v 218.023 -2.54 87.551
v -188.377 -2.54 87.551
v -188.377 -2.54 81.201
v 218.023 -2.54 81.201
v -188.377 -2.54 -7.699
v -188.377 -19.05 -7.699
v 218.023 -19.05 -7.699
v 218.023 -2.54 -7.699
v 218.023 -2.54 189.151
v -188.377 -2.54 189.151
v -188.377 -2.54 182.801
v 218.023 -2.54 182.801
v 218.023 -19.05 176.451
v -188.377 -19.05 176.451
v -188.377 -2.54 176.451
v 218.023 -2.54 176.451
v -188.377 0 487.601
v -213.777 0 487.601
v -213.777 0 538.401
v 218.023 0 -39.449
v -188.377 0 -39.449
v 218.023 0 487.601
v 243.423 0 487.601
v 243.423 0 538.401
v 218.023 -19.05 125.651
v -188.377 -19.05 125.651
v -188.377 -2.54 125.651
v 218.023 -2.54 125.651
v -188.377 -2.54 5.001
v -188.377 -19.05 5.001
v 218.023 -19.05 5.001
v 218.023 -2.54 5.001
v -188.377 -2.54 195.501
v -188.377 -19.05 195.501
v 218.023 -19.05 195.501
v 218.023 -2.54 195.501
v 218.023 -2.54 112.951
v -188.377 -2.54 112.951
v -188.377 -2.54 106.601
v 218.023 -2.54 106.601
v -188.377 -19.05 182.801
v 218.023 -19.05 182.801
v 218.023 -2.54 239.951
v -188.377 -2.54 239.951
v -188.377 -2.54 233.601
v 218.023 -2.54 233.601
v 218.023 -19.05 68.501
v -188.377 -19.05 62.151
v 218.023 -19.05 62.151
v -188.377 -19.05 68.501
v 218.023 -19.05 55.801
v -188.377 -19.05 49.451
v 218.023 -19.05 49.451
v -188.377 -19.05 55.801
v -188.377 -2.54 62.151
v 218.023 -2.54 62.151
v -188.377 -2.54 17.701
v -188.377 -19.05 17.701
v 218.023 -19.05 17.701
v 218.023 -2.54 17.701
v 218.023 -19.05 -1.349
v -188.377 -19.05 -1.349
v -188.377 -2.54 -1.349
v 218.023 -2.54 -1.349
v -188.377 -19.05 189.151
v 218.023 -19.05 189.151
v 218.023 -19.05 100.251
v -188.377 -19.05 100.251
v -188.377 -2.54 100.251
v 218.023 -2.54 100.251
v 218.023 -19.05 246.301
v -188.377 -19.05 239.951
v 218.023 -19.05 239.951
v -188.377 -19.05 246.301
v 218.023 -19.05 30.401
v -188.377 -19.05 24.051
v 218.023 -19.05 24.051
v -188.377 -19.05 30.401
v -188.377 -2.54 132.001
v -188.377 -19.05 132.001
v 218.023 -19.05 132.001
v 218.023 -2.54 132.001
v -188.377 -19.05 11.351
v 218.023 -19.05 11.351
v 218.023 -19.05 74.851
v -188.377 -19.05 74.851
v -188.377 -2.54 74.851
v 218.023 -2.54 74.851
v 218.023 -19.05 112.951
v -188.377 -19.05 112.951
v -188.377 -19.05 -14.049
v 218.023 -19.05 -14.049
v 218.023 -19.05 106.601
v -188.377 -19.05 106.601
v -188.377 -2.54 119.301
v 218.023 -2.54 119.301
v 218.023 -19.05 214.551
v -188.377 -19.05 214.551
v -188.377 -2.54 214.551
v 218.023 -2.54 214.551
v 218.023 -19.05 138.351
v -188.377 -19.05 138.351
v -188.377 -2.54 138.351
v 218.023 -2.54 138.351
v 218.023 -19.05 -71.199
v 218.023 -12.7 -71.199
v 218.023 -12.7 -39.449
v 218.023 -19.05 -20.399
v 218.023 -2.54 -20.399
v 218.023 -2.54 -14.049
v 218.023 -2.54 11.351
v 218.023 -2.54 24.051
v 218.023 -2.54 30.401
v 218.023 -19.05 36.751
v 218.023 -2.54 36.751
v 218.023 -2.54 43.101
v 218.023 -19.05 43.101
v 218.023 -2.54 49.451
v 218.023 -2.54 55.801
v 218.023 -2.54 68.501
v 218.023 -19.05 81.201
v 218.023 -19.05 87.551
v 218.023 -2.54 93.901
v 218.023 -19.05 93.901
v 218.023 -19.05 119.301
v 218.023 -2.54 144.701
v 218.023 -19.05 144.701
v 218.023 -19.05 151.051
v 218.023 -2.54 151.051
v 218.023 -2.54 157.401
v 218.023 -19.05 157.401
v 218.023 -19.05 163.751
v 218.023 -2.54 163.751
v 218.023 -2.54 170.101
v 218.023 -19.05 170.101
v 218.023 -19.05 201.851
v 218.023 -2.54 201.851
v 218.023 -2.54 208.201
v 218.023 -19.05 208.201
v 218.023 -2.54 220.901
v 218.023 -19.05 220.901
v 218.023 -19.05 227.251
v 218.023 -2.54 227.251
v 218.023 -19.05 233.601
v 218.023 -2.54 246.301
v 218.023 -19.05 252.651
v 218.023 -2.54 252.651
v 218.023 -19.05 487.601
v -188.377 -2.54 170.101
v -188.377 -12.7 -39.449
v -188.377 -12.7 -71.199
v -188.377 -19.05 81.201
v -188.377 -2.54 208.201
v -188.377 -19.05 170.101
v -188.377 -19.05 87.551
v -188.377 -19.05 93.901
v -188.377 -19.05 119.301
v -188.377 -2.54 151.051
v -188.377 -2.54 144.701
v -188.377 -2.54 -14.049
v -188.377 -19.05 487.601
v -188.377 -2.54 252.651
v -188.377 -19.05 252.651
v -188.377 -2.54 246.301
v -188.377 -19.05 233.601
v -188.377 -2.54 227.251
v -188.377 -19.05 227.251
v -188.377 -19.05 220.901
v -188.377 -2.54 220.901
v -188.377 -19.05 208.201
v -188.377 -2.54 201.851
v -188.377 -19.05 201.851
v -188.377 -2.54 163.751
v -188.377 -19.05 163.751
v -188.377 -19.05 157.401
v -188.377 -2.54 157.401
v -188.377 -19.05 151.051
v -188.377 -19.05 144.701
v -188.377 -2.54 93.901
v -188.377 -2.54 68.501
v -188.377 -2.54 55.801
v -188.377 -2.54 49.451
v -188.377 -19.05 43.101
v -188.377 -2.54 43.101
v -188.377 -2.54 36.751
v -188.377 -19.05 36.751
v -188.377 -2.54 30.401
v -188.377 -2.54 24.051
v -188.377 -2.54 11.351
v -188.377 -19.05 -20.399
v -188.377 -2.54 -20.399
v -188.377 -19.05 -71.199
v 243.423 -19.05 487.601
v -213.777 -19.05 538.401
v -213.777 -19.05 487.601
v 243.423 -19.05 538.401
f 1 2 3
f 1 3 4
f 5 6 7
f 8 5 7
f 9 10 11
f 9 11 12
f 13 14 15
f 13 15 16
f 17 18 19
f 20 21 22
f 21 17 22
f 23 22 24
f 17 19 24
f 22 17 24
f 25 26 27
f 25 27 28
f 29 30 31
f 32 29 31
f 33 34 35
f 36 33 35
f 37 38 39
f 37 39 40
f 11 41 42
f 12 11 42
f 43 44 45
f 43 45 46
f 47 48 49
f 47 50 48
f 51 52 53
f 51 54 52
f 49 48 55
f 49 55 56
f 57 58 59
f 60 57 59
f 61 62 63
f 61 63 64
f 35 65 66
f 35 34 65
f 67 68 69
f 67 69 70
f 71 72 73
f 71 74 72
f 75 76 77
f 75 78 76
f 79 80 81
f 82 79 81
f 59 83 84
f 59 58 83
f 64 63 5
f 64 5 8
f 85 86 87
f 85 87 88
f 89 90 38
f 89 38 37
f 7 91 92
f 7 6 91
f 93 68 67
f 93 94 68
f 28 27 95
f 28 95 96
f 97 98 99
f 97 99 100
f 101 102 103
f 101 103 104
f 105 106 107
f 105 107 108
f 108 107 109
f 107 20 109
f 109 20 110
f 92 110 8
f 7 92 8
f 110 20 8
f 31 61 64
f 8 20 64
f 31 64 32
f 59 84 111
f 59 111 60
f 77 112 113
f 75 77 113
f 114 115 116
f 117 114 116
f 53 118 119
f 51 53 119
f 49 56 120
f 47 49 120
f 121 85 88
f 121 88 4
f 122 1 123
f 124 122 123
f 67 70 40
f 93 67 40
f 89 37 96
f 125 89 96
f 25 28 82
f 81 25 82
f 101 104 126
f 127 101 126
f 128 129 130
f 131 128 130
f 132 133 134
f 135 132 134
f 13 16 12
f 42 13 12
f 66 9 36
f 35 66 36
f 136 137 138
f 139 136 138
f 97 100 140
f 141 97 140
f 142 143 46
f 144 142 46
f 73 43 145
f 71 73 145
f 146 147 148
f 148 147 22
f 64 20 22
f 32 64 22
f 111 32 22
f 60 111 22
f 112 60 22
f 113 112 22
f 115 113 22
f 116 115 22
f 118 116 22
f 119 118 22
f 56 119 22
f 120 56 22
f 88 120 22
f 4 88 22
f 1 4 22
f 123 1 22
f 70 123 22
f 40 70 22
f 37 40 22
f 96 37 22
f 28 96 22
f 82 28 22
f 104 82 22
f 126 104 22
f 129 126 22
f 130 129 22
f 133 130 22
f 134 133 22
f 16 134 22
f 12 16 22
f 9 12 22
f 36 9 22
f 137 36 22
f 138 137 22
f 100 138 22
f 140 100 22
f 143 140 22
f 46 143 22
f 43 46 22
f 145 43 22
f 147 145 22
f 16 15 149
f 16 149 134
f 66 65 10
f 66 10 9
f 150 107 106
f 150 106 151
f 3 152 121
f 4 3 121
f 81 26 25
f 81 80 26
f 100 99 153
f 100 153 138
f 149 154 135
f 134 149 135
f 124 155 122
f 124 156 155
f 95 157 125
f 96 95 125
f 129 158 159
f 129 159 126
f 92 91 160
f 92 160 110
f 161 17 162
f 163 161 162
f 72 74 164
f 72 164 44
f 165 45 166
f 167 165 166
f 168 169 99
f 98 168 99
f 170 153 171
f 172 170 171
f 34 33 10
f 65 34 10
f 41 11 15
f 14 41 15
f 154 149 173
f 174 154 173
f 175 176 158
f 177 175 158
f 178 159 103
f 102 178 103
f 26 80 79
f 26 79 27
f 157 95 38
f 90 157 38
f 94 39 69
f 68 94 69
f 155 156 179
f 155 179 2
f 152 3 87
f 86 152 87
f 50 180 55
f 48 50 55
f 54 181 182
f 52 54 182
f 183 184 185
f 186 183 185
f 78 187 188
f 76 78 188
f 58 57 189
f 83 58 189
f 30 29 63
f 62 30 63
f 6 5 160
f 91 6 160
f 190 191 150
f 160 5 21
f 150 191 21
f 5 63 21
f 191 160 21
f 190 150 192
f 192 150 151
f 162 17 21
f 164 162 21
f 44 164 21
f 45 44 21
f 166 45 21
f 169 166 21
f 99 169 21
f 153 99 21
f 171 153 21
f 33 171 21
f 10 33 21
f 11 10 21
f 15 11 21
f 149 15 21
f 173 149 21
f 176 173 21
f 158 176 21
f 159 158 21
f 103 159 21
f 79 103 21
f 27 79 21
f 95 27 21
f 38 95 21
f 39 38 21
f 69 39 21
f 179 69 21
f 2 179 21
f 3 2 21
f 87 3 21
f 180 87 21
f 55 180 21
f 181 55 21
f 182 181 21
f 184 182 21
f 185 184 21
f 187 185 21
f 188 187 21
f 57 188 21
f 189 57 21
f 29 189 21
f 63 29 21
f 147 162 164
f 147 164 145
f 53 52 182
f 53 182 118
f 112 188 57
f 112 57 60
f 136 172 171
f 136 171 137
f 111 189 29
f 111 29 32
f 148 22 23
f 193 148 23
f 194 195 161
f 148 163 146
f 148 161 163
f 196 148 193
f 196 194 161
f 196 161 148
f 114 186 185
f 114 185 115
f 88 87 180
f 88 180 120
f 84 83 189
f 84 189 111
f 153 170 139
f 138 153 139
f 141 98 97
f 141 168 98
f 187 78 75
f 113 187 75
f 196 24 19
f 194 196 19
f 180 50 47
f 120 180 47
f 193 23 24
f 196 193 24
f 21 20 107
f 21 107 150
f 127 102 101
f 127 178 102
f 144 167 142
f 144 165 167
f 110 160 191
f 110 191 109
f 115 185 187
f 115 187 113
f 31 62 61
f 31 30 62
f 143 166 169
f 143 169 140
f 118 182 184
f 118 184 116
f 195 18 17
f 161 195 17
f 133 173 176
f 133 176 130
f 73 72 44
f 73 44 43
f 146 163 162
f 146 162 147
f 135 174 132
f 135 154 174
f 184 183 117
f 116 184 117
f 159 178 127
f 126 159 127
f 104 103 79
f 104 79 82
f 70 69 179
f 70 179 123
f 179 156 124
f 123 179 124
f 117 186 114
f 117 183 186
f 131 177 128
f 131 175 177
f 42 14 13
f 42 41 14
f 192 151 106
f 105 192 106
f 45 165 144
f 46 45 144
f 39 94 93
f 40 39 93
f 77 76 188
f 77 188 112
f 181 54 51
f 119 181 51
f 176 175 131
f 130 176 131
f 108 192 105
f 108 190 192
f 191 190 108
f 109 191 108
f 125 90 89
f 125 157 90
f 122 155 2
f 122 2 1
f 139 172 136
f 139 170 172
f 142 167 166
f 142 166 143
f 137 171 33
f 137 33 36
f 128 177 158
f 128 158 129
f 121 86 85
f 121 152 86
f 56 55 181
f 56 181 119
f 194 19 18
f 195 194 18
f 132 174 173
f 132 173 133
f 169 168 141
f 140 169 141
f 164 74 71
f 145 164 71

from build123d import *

# Parameters (mm, degrees)
F1_DEPTH = 19.05
F2_W     = 406.4
F2_H     = 6.35
F3_DEPTH = 16.51
F4_W     = 406.4
F4_H     = 31.75
F5_DEPTH = 12.7


with BuildPart() as f1:
    # F0 (on Front) → F1 (new body)
    with BuildSketch(Plane.XZ):
        Polygon((218.022645, -71.199347), (218.022645, 487.600653), (243.422645, 487.600653), (243.422645, 538.400653), (-213.777355, 538.400653), (-213.777355, 487.600653), (-188.377355, 487.600653), (-188.377355, -71.199347), align=None)
    extrude(amount=F1_DEPTH)

    # F2 (on face) → F3 (cut)
    with BuildSketch(Plane.XZ.offset(19.05)):
        with Locations((14.822645, -17.224347)):
            Rectangle(F2_W, F2_H)
        with Locations((14.822645, -4.524347)):
            Rectangle(F2_W, F2_H)
        with Locations((14.822645, 8.175653)):
            Rectangle(F2_W, F2_H)
        with Locations((14.822645, 20.875653)):
            Rectangle(F2_W, F2_H)
        with Locations((14.822645, 33.575653)):
            Rectangle(F2_W, F2_H)
        with Locations((14.822645, 46.275653)):
            Rectangle(F2_W, F2_H)
        with Locations((14.822645, 58.975653)):
            Rectangle(F2_W, F2_H)
        with Locations((14.822645, 71.675653)):
            Rectangle(F2_W, F2_H)
        with Locations((14.822645, 84.375653)):
            Rectangle(F2_W, F2_H)
        with Locations((14.822645, 97.075653)):
            Rectangle(F2_W, F2_H)
        with Locations((14.822645, 109.775653)):
            Rectangle(F2_W, F2_H)
        with Locations((14.822645, 122.475653)):
            Rectangle(F2_W, F2_H)
        with Locations((14.822645, 135.175653)):
            Rectangle(F2_W, F2_H)
        with Locations((14.822645, 147.875653)):
            Rectangle(F2_W, F2_H)
        with Locations((14.822645, 160.575653)):
            Rectangle(F2_W, F2_H)
        with Locations((14.822645, 173.275653)):
            Rectangle(F2_W, F2_H)
        with Locations((14.822645, 185.975653)):
            Rectangle(F2_W, F2_H)
        with Locations((14.822645, 198.675653)):
            Rectangle(F2_W, F2_H)
        with Locations((14.822645, 211.375653)):
            Rectangle(F2_W, F2_H)
        with Locations((14.822645, 224.075653)):
            Rectangle(F2_W, F2_H)
        with Locations((14.822645, 236.775653)):
            Rectangle(F2_W, F2_H)
        with Locations((14.822645, 249.475653)):
            Rectangle(F2_W, F2_H)
    extrude(amount=-F3_DEPTH, mode=Mode.SUBTRACT)

    # F4 (on face) → F5 (cut)
    with BuildSketch(Plane(origin=(0, 0, 0), x_dir=(-1, 0, 0), z_dir=(0, 1, 0))):
        with Locations((-14.822645, -55.324347)):
            Rectangle(F4_W, F4_H)
    extrude(amount=-F5_DEPTH, mode=Mode.SUBTRACT)


solid = f1.part
